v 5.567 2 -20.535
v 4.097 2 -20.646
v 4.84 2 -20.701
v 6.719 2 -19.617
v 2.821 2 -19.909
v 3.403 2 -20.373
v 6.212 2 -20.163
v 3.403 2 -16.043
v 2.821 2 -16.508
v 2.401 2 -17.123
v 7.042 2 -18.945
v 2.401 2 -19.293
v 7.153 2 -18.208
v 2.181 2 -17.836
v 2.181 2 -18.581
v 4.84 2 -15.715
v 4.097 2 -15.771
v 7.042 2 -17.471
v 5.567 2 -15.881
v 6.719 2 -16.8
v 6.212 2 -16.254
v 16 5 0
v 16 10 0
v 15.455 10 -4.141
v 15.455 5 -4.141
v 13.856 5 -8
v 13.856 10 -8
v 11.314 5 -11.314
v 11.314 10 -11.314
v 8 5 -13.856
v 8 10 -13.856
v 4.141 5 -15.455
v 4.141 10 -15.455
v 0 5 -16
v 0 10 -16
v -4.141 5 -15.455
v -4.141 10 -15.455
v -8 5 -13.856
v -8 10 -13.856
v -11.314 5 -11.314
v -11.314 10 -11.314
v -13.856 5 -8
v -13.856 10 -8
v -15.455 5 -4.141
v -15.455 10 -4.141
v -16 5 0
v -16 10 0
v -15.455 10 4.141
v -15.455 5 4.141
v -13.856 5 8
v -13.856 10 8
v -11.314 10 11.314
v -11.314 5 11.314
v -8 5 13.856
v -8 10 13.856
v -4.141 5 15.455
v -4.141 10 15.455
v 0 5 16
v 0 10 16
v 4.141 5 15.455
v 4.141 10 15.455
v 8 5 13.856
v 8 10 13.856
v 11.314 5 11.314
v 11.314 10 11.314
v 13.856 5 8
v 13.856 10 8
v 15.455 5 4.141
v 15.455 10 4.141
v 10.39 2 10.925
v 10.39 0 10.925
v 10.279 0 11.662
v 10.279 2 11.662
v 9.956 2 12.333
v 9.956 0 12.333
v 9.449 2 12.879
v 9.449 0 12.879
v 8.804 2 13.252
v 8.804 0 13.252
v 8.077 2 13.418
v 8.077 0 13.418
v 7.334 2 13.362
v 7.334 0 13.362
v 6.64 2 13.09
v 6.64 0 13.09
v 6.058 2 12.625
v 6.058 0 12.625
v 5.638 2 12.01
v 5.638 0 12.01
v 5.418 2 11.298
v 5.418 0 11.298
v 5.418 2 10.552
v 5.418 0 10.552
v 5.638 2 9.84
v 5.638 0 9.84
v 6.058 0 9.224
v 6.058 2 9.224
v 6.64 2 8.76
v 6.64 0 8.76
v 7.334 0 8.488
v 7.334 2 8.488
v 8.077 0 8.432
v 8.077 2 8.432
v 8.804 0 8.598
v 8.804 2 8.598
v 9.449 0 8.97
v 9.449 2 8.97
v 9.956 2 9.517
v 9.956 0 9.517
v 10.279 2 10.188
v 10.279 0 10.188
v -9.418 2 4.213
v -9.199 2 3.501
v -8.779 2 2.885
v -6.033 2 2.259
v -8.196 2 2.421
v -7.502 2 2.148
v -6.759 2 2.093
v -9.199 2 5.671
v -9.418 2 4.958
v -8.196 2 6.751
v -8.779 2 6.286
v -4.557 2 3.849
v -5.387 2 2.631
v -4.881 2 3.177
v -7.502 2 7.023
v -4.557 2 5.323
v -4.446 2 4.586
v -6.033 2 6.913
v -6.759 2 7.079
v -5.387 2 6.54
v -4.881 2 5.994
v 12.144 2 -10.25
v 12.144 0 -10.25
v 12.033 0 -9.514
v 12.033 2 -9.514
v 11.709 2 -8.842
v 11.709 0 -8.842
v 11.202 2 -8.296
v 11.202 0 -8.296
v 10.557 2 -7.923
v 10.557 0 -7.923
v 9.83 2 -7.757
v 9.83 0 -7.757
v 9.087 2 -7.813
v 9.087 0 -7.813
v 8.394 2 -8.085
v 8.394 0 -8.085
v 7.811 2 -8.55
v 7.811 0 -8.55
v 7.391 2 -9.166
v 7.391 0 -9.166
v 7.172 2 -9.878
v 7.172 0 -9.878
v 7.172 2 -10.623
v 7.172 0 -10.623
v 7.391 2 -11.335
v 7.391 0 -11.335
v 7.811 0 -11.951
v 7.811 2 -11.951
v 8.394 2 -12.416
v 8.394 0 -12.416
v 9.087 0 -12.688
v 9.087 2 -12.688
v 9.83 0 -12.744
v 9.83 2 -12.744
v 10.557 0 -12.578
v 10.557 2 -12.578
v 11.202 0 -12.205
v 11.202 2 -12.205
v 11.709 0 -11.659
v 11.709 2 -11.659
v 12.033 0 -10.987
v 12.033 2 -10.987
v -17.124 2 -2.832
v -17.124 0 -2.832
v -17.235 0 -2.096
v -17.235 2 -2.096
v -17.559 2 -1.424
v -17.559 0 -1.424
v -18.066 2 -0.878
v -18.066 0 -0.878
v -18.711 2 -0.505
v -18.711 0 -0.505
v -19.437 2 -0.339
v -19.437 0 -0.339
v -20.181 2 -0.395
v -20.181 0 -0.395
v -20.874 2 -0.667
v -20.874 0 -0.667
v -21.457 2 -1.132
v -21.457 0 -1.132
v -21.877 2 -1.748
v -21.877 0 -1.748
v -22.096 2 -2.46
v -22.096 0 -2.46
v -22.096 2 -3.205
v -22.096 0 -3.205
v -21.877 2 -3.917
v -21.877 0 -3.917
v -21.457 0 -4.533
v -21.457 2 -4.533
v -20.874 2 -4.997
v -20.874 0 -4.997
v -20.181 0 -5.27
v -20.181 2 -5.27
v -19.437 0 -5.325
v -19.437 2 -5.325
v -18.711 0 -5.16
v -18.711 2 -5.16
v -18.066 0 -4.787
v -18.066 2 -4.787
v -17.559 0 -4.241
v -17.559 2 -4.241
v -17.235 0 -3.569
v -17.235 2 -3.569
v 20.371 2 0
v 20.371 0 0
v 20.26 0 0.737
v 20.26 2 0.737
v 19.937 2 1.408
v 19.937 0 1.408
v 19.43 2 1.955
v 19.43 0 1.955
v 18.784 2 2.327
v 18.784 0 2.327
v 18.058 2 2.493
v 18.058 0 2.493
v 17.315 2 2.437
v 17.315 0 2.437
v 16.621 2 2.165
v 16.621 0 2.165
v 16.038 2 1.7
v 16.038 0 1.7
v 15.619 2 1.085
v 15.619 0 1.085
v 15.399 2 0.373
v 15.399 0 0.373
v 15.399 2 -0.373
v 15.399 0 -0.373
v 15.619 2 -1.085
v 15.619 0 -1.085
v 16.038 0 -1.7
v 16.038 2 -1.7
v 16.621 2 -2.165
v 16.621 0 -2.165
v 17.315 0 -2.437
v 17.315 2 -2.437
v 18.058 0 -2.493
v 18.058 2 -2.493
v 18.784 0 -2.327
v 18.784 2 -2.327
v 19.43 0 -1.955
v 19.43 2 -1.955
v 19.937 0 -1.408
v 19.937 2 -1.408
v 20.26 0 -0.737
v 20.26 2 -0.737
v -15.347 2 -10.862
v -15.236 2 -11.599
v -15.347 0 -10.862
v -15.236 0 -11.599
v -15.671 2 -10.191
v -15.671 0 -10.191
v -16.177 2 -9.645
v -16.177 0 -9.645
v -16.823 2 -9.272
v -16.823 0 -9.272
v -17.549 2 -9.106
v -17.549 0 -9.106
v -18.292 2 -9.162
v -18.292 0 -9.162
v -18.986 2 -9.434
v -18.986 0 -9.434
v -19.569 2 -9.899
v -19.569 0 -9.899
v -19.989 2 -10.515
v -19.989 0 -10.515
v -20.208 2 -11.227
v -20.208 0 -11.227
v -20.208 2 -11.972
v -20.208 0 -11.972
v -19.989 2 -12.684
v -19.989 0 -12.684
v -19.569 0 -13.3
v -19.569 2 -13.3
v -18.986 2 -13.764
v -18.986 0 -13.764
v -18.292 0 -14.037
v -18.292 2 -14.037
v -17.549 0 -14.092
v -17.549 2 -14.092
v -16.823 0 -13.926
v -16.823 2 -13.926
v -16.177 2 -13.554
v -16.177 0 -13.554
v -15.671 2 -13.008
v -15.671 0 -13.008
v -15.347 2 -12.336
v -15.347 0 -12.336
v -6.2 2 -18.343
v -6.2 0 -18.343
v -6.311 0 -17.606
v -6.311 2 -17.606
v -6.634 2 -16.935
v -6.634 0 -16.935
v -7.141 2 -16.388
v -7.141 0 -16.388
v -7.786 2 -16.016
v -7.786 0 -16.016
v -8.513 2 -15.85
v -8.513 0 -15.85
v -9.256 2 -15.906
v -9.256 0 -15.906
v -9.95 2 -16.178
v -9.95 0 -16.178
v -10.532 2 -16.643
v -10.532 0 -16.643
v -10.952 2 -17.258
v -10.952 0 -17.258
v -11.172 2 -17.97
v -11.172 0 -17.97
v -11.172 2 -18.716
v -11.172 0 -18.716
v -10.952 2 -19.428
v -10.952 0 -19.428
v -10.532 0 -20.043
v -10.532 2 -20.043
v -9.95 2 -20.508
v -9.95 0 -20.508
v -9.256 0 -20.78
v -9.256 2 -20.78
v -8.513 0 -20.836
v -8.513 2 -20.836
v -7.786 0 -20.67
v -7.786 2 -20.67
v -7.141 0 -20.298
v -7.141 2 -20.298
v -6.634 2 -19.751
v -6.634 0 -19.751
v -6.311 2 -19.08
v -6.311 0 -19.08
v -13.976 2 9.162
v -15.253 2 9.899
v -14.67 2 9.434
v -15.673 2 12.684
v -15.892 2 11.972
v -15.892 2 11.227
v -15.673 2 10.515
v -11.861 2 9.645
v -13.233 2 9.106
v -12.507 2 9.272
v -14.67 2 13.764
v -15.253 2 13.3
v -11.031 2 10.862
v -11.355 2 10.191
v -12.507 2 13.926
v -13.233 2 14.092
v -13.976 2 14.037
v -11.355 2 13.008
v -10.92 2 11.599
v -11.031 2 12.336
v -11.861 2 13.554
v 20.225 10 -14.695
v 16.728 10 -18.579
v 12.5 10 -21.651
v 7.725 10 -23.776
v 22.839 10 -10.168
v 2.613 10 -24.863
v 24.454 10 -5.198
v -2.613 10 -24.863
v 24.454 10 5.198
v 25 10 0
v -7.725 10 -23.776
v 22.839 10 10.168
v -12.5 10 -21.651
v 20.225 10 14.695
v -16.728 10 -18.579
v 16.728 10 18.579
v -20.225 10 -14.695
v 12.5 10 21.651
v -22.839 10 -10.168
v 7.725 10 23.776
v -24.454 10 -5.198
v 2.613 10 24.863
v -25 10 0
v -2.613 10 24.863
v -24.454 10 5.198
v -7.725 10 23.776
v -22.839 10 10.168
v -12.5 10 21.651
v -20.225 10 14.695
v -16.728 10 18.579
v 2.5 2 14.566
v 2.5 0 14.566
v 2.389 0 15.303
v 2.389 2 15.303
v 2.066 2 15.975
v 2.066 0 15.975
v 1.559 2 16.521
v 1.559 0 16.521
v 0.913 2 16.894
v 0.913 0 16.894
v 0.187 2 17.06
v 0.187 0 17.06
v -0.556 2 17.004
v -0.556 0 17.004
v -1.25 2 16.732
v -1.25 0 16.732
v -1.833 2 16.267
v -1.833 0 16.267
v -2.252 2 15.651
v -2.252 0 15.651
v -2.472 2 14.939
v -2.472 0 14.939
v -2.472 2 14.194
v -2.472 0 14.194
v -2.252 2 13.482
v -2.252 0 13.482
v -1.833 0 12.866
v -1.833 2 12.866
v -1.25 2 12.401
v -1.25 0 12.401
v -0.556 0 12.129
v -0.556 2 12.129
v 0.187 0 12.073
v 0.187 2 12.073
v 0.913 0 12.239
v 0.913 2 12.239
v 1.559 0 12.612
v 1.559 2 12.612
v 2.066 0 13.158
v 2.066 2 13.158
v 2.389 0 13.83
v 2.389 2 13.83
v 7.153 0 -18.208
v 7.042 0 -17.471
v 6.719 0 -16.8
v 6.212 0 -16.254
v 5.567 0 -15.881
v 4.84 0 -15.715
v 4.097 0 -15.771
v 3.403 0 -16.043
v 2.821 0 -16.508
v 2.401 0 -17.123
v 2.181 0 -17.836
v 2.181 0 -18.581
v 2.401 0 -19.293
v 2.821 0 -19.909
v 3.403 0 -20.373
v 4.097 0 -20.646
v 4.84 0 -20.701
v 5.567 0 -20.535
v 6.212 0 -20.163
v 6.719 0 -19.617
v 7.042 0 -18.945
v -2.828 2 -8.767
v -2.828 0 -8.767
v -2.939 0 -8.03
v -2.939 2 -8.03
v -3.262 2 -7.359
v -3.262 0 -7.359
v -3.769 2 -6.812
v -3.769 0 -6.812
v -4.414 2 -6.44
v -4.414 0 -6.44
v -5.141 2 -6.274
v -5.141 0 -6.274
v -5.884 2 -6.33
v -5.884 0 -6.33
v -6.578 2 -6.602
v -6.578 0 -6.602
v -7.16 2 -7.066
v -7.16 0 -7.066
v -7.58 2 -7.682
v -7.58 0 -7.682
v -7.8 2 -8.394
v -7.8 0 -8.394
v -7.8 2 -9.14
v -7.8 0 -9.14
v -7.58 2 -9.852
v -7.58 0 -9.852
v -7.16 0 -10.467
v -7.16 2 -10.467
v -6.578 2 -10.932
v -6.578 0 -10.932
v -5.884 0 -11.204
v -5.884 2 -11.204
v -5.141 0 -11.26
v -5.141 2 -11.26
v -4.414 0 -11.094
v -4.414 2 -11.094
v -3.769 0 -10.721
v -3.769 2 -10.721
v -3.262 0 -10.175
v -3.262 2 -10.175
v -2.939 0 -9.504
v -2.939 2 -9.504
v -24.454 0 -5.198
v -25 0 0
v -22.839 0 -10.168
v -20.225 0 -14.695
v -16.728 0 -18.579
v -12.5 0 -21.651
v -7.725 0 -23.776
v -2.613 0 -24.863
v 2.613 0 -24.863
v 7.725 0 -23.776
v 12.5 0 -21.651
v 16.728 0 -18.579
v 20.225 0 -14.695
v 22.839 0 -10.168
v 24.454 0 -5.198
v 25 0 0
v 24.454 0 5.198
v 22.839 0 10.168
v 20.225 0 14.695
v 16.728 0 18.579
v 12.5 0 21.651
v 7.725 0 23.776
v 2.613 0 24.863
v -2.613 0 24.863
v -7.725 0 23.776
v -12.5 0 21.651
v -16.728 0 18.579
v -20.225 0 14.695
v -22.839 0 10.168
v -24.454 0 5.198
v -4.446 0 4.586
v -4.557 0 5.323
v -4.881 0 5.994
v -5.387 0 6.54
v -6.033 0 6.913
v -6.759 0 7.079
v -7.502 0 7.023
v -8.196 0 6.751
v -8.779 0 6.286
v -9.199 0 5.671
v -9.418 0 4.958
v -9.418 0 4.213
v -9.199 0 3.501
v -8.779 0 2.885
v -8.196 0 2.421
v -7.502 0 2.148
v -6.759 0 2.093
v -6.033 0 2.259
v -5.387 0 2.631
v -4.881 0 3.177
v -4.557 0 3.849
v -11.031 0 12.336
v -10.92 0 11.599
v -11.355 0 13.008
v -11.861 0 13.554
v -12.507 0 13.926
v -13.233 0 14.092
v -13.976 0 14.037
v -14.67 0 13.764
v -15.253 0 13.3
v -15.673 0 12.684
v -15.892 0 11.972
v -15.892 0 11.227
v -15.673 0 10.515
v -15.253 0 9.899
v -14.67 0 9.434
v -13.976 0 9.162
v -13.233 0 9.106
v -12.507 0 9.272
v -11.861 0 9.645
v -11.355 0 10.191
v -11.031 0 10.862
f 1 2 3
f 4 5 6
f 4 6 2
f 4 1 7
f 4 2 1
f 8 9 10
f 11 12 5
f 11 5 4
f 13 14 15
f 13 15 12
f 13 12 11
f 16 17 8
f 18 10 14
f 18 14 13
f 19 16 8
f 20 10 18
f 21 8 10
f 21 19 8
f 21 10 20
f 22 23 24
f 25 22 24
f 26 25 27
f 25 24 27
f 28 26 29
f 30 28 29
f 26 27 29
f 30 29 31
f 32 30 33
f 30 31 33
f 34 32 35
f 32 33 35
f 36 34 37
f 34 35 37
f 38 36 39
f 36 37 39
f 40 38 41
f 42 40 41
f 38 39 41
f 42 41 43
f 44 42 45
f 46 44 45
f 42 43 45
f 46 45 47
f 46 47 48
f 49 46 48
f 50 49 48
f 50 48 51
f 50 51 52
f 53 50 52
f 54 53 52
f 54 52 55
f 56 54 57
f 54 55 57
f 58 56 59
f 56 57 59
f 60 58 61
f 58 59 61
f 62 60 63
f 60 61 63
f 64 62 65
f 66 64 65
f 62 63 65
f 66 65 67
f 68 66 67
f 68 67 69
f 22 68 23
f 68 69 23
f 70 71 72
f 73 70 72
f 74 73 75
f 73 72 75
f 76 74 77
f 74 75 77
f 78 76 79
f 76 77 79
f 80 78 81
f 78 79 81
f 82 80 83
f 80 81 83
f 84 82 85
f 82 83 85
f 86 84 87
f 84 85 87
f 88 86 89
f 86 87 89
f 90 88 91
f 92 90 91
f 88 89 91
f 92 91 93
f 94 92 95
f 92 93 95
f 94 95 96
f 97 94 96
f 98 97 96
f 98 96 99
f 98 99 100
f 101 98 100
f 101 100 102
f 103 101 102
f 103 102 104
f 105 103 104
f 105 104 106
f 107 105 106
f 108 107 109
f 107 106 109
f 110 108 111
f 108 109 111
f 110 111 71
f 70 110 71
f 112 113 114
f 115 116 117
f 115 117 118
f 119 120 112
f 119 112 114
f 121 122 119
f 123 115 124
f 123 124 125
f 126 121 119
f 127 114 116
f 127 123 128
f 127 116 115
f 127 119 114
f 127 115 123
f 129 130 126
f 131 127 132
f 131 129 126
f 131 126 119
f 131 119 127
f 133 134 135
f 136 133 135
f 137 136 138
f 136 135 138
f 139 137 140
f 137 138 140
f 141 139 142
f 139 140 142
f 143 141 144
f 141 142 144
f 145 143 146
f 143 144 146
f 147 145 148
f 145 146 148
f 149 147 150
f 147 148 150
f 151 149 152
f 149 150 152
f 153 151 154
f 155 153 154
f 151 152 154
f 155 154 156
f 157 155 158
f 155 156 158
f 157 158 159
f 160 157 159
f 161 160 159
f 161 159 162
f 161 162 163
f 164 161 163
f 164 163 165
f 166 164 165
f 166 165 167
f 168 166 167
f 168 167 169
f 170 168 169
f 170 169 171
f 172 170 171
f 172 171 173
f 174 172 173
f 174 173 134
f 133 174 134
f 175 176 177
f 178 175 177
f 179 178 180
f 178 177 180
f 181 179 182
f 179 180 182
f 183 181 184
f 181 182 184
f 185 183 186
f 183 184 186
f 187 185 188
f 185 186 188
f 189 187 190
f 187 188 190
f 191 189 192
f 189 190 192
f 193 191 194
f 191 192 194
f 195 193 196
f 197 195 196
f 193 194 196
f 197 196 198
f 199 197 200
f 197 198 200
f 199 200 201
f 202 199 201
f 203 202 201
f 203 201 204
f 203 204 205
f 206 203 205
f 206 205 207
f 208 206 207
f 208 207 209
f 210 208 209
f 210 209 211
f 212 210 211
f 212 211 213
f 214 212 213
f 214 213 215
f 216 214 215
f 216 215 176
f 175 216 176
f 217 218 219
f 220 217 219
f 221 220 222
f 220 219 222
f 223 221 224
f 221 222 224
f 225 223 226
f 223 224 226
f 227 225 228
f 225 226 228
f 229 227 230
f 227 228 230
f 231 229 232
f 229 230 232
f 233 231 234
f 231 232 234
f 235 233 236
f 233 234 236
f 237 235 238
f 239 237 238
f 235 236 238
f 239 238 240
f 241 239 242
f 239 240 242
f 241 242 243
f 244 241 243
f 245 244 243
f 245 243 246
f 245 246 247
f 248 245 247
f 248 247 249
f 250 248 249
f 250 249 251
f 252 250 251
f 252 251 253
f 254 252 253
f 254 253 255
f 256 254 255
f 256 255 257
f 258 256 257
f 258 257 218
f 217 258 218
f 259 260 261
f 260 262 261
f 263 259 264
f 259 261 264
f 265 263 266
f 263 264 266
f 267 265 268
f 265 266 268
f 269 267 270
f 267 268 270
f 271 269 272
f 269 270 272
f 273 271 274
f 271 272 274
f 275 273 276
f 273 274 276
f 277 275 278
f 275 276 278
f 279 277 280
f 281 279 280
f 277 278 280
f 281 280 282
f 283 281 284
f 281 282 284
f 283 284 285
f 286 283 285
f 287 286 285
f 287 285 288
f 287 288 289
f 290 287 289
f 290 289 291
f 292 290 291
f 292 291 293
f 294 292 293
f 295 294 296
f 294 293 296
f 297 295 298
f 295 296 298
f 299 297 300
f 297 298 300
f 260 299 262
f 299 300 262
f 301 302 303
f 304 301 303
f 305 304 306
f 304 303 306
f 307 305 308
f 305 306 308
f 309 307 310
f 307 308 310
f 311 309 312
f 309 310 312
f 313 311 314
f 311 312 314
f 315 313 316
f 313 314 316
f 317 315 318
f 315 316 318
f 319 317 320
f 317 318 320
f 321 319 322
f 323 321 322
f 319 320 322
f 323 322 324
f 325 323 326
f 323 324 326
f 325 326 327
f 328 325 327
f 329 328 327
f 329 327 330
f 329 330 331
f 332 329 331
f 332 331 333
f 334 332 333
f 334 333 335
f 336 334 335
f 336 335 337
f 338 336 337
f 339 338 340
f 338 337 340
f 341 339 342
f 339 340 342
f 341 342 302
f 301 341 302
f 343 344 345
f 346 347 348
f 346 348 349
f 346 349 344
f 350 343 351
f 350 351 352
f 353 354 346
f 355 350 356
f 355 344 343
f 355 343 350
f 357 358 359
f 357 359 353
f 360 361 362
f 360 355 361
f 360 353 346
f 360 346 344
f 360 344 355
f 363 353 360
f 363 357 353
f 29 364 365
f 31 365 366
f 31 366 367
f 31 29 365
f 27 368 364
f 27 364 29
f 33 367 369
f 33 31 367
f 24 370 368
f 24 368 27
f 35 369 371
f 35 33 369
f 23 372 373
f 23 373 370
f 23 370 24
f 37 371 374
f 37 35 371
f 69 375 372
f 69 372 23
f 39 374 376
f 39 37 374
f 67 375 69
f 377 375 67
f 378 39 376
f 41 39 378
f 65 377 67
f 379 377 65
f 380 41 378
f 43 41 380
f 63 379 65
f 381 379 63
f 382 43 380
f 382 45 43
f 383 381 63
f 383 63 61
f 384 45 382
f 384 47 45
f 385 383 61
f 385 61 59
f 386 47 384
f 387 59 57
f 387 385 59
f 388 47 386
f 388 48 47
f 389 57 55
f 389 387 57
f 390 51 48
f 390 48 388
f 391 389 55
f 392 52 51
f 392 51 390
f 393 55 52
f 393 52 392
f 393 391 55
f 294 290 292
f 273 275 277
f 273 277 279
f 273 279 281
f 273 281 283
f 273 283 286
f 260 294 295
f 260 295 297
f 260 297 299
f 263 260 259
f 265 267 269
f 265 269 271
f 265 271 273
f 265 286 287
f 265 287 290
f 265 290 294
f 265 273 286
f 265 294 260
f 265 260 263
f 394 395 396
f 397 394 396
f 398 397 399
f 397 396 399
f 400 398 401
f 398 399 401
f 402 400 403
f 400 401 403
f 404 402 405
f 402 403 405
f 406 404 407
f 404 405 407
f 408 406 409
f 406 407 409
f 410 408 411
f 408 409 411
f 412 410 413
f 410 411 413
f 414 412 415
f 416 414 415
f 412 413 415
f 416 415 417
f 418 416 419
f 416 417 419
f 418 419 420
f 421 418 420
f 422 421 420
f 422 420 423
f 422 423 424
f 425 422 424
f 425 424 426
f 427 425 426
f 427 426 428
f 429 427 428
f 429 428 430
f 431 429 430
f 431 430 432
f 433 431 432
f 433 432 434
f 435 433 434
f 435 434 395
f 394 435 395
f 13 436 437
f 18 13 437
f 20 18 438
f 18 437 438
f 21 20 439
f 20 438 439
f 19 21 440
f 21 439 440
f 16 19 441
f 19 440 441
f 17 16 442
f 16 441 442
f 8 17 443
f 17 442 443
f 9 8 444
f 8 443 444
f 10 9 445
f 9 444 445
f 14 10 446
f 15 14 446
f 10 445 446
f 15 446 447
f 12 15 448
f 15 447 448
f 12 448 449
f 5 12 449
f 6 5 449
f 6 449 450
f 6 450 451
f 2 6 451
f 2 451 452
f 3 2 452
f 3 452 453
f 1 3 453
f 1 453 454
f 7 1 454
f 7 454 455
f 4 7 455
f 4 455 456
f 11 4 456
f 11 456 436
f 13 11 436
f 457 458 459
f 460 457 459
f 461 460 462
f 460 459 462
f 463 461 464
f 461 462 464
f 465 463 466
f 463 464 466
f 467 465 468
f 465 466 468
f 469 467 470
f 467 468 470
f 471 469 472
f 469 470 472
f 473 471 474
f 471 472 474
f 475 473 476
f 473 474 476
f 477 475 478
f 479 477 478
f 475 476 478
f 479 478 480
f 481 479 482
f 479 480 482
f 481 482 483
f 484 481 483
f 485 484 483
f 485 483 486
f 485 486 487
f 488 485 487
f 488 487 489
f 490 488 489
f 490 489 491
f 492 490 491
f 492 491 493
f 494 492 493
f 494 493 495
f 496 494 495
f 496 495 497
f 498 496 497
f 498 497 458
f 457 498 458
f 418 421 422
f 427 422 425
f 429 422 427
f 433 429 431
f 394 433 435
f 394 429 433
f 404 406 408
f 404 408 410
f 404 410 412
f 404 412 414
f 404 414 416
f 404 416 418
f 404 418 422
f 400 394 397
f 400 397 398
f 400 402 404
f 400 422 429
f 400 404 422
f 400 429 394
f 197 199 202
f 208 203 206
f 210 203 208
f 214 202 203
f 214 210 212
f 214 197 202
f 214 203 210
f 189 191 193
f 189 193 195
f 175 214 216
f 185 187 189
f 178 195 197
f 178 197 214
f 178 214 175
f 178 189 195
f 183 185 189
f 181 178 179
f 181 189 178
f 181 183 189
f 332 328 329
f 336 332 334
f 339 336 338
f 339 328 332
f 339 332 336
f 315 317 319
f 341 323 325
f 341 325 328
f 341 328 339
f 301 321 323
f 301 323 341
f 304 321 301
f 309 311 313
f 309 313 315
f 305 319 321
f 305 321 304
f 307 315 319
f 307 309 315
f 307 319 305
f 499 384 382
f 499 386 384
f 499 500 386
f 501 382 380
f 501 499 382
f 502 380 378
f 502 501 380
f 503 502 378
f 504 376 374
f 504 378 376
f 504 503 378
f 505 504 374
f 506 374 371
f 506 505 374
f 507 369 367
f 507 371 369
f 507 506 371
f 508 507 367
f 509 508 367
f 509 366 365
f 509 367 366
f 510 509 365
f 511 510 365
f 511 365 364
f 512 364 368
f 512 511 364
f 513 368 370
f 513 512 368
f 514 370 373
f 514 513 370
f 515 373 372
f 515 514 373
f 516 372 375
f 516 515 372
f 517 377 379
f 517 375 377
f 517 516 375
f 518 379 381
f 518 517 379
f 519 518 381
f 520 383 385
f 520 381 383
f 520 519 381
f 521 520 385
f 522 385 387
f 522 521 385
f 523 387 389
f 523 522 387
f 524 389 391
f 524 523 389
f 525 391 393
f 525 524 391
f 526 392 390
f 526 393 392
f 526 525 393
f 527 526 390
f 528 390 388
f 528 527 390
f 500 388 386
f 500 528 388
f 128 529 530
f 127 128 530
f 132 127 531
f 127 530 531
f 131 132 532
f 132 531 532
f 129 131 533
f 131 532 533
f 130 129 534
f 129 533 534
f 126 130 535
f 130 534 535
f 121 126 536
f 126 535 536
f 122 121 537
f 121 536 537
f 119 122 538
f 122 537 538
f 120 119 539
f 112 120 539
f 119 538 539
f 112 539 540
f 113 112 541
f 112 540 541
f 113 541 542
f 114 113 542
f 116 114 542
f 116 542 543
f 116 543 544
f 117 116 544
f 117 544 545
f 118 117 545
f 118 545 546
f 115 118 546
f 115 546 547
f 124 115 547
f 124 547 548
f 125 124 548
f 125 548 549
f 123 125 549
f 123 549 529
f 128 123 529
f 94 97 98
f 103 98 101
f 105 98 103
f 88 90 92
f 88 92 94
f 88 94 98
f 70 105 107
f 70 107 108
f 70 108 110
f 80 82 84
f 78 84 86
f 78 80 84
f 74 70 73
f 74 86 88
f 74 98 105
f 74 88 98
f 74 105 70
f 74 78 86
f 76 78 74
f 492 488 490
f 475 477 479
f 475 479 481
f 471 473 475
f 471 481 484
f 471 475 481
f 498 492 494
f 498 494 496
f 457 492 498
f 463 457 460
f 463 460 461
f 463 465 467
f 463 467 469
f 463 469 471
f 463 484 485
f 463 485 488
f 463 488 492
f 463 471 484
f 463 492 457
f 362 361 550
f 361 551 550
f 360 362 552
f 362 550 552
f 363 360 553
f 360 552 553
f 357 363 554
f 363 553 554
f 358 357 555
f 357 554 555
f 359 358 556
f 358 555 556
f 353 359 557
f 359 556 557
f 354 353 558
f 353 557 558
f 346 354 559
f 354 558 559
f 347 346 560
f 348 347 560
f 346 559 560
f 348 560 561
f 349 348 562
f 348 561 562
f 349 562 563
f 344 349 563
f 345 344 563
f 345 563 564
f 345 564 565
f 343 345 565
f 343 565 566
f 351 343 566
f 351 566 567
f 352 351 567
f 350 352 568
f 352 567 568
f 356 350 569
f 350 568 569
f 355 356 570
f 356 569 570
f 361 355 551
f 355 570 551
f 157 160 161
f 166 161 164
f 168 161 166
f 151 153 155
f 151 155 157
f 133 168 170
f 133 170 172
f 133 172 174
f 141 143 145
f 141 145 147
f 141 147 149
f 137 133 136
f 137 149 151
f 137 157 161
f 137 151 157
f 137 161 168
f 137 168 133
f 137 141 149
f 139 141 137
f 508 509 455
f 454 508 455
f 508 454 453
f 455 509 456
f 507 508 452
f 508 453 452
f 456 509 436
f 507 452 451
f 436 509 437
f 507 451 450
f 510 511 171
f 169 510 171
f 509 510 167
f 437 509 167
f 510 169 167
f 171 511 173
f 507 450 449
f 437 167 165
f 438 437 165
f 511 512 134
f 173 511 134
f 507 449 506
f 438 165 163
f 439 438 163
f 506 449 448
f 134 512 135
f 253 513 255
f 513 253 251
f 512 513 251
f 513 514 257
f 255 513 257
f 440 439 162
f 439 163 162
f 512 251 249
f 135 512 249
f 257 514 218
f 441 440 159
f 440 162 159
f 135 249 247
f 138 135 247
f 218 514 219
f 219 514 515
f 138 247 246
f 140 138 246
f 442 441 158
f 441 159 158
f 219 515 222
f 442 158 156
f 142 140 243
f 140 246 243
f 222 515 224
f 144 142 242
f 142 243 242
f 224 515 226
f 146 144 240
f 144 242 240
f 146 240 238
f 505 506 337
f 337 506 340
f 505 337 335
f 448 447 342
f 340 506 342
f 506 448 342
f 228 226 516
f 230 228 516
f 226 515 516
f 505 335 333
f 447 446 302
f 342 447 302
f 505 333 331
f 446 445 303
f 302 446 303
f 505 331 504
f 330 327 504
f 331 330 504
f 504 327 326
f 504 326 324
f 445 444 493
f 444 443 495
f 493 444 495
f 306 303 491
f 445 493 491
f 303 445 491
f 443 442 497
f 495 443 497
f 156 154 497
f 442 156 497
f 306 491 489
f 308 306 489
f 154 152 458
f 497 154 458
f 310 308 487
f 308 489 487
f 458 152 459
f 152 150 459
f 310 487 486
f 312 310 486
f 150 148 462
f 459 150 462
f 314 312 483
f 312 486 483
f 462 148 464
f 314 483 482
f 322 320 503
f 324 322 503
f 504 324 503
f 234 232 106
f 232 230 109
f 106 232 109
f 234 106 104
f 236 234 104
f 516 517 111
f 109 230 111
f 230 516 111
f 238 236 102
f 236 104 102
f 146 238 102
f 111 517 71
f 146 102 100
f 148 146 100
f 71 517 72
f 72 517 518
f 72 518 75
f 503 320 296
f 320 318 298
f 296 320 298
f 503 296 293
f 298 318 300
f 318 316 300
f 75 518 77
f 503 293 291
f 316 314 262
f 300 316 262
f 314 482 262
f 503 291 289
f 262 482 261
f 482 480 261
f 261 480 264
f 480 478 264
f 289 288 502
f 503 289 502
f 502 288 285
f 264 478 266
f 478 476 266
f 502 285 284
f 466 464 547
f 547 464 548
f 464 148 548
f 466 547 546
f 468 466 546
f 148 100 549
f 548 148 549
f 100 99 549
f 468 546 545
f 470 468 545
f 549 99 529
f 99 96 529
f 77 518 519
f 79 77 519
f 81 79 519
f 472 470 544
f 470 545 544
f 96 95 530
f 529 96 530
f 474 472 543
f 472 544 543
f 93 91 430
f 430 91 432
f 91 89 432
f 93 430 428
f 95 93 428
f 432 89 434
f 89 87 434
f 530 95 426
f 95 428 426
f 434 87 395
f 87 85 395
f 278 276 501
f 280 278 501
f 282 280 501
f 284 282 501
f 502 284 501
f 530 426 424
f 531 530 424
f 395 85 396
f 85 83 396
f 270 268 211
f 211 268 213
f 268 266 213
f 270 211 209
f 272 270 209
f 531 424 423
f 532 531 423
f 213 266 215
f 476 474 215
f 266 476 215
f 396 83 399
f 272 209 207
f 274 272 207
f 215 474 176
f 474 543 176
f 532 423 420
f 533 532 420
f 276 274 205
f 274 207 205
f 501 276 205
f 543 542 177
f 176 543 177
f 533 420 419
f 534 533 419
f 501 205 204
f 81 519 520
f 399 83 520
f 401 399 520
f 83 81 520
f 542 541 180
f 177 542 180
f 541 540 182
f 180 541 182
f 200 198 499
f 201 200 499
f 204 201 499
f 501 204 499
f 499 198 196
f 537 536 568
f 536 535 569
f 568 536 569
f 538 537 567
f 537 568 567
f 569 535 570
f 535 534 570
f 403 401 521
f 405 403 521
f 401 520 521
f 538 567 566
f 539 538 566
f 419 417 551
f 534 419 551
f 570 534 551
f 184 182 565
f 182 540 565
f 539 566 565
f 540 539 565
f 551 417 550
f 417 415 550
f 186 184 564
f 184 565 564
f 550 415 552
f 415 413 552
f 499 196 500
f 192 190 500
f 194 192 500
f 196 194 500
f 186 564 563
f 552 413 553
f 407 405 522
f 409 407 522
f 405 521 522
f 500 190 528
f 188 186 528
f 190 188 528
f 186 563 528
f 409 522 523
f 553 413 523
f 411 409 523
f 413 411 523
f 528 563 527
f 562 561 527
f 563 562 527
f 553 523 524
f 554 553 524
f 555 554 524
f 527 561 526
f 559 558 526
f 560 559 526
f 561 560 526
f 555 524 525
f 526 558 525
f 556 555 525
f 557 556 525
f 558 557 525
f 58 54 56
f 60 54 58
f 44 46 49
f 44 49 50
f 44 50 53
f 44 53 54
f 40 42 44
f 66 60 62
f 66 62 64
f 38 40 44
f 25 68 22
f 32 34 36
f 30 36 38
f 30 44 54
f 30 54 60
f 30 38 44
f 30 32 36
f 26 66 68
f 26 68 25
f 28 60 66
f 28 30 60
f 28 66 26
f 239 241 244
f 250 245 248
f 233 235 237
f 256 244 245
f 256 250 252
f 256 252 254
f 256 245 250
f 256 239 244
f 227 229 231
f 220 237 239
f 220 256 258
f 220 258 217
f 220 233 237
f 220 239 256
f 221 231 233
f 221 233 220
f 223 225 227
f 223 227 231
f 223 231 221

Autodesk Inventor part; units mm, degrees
ref_plane "YZ Plane" through (0, 0, 0) normal (1, 0, 0) x (0, 1, 0)
ref_plane "XZ Plane" through (0, 0, 0) normal (0, 1, 0) x (-1, 0, 0)
ref_plane "XY Plane" through (0, 0, 0) normal (0, 0, 1) x (1, 0, 0)
sketch "Sketch1" plane through (0, 0, 0) normal (0, 1, 0) x (-1, 0, 0)
  circle A0 centre (0, 0) radius 25
  dimension "d0" = 50
sketch "Sketch2" plane through (0, 0, 0) normal (0, 1, 0) x (-1, 0, 0)
  point P0 (0, 0)
extrude "Extrusion1" add sketch "Sketch1" along normal blind 10
sketch "Sketch3" plane through (0, 10, 0) normal (0, 1, 0) x (1, 0, 0)
  circle A0 centre (0, 0) radius 16
  dimension "d3" = 32
extrude "Extrusion2" cut sketch "Sketch3" against normal blind 5
sketch "Sketch4" plane through (0, 0, 0) normal (0, -1, 0) x (1, 0, 0)
  point P0 (0, 0)
sketch "Sketch5" plane through (0, 0, 0) normal (0, -1, 0) x (1, 0, 0)
  circle A0 centre (-17.7361, -11.5993) radius 2.5
  point P0 (0, 0)
  dimension "d6" = 5
extrude "Extrusion3" cut sketch "Sketch5" against normal blind 2
sketch "Sketch6" plane through (0, 0, 0) normal (0, -1, 0) x (1, 0, 0)
  circle A0 centre (-19.6243, -2.8324) radius 2.5
  point P0 (0, 0)
  dimension "d9" = 5
extrude "Extrusion4" cut sketch "Sketch6" against normal blind 2
sketch "Sketch7" plane through (0, 0, 0) normal (0, -1, 0) x (1, 0, 0)
  circle A0 centre (-8.6995, -18.343) radius 2.5
  point P0 (0, 0)
  dimension "d12" = 5
extrude "Extrusion5" cut sketch "Sketch7" against normal blind 2
sketch "Sketch8" plane through (0, 0, 0) normal (0, -1, 0) x (1, 0, 0)
  circle A0 centre (4.6532, -18.2082) radius 2.5
  point P0 (0, 0)
  dimension "d15" = 5
extrude "Extrusion6" cut sketch "Sketch8" against normal blind 2
sketch "Sketch9" plane through (0, 0, 0) normal (0, -1, 0) x (1, 0, 0)
  circle A0 centre (-5.3276, -8.7669) radius 2.5
  point P0 (0, 0)
  dimension "d18" = 5
extrude "Extrusion7" cut sketch "Sketch9" against normal blind 2
sketch "Sketch10" plane through (0, 0, 0) normal (0, -1, 0) x (1, 0, 0)
  circle A0 centre (9.6436, -10.2505) radius 2.5
  point P0 (0, 0)
  dimension "d21" = 5
extrude "Extrusion8" cut sketch "Sketch10" against normal blind 2
sketch "Sketch11" plane through (0, 0, 0) normal (0, -1, 0) x (1, 0, 0)
  circle A0 centre (-6.9461, 4.5858) radius 2.5
  point P0 (0, 0)
  dimension "d24" = 5
extrude "Extrusion9" cut sketch "Sketch11" against normal blind 2
sketch "Sketch12" plane through (0, 0, 0) normal (0, -1, 0) x (1, 0, 0)
  circle A0 centre (7.8902, 10.9249) radius 2.5
  point P0 (0, 0)
  dimension "d27" = 5
extrude "Extrusion10" cut sketch "Sketch12" against normal blind 2
sketch "Sketch13" plane through (0, 0, 0) normal (0, -1, 0) x (1, 0, 0)
  circle A0 centre (-13.4201, 11.5993) radius 2.5
  point P0 (0, 0)
  dimension "d30" = 5
extrude "Extrusion11" cut sketch "Sketch13" against normal blind 2
sketch "Sketch14" plane through (0, 0, 0) normal (0, -1, 0) x (1, 0, 0)
  circle A0 centre (17.871, 0) radius 2.5
  point P0 (0, 0)
  dimension "d33" = 5
extrude "Extrusion12" cut sketch "Sketch14" against normal blind 2
sketch "Sketch15" plane through (0, 0, 0) normal (0, -1, 0) x (1, 0, 0)
  circle A0 centre (0, 14.5665) radius 2.5
  point P0 (0, 0)
  dimension "d36" = 5
extrude "Extrusion13" cut sketch "Sketch15" against normal blind 2
properties part number "sprayer" material "PVC, Unplasticized"
